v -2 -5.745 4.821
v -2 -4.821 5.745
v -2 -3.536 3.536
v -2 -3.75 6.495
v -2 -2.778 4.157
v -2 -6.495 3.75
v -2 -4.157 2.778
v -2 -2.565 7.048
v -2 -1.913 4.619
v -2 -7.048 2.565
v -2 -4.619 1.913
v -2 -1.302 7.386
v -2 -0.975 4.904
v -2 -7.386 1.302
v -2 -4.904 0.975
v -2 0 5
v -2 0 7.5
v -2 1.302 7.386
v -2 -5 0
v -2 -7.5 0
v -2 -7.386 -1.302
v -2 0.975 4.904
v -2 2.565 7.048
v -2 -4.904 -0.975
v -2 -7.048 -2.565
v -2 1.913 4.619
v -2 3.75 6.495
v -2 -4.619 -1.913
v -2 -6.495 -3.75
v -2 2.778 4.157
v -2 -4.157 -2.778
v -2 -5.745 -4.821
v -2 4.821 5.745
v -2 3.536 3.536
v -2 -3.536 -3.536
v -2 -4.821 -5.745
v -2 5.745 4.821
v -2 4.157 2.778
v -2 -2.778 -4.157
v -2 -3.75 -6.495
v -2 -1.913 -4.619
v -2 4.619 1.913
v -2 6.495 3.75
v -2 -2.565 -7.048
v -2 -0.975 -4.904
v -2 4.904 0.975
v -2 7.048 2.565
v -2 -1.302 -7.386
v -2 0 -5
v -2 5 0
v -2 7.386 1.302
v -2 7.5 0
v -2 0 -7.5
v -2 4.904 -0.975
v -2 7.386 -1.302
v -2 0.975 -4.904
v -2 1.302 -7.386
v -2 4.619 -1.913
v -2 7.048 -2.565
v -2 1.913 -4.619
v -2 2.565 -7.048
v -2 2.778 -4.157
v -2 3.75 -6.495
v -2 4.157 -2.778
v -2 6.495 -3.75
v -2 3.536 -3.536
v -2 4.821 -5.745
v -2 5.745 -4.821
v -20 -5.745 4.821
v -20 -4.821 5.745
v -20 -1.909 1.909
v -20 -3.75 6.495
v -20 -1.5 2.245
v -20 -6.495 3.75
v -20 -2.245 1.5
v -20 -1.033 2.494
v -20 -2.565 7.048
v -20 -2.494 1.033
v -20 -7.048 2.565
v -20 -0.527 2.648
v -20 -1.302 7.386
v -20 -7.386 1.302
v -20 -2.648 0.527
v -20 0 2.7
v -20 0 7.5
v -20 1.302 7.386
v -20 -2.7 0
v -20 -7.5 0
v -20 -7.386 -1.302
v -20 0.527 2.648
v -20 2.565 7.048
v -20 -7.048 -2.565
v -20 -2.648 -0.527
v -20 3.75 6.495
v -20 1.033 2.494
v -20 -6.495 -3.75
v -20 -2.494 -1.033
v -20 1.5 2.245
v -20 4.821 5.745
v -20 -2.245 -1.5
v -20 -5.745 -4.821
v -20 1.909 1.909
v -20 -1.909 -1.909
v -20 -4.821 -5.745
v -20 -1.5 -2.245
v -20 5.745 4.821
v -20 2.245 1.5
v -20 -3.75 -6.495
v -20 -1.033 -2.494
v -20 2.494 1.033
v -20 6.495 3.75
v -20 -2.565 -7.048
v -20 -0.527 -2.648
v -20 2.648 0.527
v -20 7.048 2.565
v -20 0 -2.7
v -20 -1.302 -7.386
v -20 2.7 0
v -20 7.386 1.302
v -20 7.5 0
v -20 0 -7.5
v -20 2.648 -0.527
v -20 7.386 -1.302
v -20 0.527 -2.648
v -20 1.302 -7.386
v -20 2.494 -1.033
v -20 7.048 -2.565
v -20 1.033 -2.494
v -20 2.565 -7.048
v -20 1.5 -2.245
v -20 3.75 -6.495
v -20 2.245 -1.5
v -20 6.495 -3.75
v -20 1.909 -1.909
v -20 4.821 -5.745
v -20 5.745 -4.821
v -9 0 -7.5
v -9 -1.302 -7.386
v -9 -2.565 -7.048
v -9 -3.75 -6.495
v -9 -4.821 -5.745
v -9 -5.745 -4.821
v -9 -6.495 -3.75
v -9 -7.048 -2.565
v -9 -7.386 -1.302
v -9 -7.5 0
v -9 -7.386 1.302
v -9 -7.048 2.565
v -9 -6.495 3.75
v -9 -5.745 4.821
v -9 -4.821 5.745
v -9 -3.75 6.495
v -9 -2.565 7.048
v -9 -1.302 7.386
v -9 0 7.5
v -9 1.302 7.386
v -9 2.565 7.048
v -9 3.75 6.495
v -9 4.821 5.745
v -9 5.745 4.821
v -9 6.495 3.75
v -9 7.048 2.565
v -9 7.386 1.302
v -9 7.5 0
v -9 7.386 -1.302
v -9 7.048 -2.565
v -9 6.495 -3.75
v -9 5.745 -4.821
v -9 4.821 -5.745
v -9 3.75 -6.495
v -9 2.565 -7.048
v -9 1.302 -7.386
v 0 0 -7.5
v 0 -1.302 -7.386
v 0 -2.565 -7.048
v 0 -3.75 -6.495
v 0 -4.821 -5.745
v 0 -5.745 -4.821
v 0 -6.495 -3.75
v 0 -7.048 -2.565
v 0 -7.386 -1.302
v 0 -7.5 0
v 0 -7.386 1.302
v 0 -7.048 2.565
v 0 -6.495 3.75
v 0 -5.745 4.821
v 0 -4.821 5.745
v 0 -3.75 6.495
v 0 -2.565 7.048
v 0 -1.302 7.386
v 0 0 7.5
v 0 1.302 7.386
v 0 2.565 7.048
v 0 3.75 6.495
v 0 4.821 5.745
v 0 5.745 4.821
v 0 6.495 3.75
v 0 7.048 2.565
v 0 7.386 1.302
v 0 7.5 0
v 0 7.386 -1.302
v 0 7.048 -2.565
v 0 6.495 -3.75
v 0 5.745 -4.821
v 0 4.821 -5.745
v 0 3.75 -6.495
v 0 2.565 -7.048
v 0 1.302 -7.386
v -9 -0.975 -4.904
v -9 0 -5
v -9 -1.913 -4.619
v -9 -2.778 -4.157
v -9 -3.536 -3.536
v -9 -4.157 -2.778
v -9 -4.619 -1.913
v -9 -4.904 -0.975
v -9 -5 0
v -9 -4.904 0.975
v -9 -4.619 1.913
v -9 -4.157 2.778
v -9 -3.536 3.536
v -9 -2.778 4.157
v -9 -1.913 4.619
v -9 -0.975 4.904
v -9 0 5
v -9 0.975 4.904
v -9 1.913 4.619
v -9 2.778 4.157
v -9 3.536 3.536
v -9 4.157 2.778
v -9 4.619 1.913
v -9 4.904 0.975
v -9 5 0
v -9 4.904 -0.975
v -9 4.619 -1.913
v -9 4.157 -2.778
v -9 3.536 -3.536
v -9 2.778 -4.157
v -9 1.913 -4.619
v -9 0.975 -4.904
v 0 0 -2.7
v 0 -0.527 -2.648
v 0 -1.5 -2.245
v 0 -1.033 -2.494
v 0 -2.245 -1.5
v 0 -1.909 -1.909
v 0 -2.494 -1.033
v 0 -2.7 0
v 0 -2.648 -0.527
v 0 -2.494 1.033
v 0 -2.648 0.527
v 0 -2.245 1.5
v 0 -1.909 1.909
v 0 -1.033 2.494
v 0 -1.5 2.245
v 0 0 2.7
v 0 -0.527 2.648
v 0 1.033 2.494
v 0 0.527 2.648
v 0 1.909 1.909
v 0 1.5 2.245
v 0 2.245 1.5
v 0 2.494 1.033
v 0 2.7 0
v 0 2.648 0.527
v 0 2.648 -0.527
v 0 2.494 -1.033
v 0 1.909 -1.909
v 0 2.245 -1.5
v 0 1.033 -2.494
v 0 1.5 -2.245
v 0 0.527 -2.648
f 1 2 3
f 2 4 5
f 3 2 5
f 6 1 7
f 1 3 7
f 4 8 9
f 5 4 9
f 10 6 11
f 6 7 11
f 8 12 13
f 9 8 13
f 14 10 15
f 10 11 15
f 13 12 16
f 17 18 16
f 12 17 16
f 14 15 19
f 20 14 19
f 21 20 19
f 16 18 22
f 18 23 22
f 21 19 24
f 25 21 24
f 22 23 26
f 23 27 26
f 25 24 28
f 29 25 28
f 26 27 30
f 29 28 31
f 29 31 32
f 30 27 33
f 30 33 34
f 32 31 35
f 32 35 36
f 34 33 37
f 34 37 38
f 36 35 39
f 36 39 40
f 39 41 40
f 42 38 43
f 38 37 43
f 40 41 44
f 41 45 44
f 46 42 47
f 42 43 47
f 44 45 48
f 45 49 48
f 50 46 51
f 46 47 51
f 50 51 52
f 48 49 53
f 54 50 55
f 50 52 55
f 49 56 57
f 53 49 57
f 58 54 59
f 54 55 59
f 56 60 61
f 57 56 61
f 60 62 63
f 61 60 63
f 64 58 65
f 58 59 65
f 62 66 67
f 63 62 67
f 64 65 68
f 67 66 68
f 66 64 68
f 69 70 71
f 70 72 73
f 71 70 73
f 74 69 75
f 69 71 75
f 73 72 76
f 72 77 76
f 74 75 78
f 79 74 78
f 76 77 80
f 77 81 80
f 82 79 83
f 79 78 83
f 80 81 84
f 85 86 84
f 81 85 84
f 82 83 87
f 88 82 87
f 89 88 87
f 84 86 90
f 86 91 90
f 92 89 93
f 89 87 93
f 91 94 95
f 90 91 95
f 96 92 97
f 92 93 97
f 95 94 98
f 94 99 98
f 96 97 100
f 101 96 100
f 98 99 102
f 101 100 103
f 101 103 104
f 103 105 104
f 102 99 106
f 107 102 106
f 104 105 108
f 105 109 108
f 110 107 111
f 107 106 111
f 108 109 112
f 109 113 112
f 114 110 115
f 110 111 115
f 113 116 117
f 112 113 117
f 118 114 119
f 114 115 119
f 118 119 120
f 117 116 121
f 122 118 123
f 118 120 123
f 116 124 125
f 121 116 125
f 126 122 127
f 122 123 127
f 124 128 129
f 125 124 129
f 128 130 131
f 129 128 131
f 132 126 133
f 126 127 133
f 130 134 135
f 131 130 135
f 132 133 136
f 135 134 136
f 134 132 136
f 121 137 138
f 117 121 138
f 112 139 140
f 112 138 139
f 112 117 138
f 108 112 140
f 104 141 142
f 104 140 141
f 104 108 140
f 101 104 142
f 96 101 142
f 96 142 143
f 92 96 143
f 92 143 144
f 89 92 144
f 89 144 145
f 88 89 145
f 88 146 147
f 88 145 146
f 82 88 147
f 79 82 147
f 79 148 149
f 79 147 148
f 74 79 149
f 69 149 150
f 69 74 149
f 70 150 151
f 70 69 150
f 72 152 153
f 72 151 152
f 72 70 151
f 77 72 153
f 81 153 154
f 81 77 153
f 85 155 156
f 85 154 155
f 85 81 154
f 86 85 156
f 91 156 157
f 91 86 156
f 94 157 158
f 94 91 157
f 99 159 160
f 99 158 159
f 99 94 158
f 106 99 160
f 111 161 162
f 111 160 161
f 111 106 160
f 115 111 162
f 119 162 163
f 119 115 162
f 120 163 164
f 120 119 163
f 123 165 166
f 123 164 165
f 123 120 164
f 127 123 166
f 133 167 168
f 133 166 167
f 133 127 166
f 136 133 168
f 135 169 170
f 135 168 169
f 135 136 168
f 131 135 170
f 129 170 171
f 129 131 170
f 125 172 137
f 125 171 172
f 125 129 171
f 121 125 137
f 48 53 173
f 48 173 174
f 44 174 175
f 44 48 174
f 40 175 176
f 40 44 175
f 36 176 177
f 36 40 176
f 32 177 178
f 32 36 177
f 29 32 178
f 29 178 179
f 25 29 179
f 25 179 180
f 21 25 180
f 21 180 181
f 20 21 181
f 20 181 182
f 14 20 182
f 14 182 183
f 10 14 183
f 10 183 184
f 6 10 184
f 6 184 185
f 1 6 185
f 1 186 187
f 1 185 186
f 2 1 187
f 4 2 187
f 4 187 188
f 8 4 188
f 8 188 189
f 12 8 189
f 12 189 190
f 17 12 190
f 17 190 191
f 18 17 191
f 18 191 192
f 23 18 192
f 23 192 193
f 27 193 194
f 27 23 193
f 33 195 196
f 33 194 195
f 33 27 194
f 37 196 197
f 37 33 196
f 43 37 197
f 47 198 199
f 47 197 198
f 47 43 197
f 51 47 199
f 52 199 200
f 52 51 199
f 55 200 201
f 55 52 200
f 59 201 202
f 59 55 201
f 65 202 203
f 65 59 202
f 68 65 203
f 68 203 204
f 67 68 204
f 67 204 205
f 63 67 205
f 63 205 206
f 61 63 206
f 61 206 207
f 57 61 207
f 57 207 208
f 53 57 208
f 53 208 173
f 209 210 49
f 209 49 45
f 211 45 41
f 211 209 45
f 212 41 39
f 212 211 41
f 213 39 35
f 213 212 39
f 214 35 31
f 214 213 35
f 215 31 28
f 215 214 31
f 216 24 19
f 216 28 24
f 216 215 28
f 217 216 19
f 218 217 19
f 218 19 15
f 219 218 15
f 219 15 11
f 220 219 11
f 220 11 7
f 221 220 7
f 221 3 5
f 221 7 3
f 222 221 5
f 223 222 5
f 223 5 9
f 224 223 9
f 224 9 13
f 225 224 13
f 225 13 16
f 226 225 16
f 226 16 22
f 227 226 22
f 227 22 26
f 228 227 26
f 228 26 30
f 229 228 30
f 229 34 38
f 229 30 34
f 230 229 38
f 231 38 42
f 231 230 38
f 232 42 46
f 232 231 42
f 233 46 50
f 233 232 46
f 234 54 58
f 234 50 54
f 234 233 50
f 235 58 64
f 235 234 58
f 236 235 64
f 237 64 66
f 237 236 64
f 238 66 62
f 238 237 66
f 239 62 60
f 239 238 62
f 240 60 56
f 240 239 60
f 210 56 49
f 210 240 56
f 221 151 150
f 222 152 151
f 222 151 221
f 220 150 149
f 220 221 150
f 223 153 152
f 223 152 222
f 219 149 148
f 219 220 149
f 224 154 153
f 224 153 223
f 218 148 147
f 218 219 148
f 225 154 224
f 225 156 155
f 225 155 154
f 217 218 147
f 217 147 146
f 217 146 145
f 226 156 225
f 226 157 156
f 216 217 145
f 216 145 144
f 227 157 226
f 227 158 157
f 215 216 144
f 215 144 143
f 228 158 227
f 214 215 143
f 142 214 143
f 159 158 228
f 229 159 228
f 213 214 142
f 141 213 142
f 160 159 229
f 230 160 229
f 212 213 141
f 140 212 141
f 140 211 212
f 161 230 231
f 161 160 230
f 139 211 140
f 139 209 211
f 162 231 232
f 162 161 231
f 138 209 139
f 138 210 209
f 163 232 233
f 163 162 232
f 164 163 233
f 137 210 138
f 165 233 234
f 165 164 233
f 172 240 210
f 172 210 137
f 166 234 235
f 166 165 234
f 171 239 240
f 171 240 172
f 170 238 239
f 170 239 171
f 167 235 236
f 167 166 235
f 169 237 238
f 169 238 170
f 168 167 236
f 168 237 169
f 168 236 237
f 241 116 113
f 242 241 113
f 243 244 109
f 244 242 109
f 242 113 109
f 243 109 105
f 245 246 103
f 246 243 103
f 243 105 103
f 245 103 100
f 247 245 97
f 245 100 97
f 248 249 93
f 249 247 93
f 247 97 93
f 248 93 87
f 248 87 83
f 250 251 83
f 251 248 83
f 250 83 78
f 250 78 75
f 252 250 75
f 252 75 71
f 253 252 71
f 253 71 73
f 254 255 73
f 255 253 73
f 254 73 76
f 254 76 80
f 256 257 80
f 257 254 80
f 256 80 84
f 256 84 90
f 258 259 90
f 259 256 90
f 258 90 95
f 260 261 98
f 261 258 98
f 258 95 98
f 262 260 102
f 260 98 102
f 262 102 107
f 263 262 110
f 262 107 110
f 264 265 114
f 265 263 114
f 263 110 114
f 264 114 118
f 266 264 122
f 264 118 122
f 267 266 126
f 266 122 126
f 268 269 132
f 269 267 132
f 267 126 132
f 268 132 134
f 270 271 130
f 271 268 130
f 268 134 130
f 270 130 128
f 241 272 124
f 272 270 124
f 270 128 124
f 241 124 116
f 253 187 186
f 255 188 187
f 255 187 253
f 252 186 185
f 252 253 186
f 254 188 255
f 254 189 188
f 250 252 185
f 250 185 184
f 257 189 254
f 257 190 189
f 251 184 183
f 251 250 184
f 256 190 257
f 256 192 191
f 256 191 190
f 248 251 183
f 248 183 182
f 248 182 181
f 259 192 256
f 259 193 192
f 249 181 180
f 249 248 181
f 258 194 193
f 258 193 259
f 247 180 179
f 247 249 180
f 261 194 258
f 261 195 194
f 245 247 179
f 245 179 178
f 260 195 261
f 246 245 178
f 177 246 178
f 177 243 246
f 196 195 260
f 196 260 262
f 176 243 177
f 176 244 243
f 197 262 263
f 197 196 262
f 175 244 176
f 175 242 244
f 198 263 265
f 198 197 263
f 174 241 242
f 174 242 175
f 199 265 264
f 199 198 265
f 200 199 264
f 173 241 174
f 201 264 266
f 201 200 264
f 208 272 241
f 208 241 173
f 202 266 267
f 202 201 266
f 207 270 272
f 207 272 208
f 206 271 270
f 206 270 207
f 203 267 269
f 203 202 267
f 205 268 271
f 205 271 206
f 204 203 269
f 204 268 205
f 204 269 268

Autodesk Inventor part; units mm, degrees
ref_plane "YZ Plane" through (0, 0, 0) normal (1, 0, 0) x (0, 1, 0)
ref_plane "XZ Plane" through (0, 0, 0) normal (0, 1, 0) x (-1, 0, 0)
ref_plane "XY Plane" through (0, 0, 0) normal (0, 0, 1) x (1, 0, 0)
sketch "Sketch1" plane through (0, 0, 0) normal (0, 1, 0) x (-1, 0, 0)
  line L0 (0, 0) -> (0, -7.5)
  line L1 (0, -7.5) -> (2, -7.5)
  line L2 (2, -7.5) -> (2, -5)
  line L3 (2, -5) -> (9, -5)
  line L4 (9, -5) -> (9, -7.5)
  line L5 (9, -7.5) -> (20, -7.5)
  line L6 (20, -7.5) -> (20, 0)
  line L7 (20, 0) -> (0, 0)
  line L8 (0, -2.7) -> (20, -2.7)
  dimension "d0" = 7.5
  dimension "d1" = 7.5
  dimension "d2" = 5
  dimension "d3" = 2
  dimension "d4" = 11
  dimension "d5" = 7
  dimension "d7" = 2.7
revolve "Revolution1" add sketch "Sketch1" angle 360 about axis through (-20, 0, 0) along (1, 0, 0) contours L8 L6 L5 L4 L3 L2 L1 L0
equation "\"d1\" = d0"
properties part number "IdlerPulley"
